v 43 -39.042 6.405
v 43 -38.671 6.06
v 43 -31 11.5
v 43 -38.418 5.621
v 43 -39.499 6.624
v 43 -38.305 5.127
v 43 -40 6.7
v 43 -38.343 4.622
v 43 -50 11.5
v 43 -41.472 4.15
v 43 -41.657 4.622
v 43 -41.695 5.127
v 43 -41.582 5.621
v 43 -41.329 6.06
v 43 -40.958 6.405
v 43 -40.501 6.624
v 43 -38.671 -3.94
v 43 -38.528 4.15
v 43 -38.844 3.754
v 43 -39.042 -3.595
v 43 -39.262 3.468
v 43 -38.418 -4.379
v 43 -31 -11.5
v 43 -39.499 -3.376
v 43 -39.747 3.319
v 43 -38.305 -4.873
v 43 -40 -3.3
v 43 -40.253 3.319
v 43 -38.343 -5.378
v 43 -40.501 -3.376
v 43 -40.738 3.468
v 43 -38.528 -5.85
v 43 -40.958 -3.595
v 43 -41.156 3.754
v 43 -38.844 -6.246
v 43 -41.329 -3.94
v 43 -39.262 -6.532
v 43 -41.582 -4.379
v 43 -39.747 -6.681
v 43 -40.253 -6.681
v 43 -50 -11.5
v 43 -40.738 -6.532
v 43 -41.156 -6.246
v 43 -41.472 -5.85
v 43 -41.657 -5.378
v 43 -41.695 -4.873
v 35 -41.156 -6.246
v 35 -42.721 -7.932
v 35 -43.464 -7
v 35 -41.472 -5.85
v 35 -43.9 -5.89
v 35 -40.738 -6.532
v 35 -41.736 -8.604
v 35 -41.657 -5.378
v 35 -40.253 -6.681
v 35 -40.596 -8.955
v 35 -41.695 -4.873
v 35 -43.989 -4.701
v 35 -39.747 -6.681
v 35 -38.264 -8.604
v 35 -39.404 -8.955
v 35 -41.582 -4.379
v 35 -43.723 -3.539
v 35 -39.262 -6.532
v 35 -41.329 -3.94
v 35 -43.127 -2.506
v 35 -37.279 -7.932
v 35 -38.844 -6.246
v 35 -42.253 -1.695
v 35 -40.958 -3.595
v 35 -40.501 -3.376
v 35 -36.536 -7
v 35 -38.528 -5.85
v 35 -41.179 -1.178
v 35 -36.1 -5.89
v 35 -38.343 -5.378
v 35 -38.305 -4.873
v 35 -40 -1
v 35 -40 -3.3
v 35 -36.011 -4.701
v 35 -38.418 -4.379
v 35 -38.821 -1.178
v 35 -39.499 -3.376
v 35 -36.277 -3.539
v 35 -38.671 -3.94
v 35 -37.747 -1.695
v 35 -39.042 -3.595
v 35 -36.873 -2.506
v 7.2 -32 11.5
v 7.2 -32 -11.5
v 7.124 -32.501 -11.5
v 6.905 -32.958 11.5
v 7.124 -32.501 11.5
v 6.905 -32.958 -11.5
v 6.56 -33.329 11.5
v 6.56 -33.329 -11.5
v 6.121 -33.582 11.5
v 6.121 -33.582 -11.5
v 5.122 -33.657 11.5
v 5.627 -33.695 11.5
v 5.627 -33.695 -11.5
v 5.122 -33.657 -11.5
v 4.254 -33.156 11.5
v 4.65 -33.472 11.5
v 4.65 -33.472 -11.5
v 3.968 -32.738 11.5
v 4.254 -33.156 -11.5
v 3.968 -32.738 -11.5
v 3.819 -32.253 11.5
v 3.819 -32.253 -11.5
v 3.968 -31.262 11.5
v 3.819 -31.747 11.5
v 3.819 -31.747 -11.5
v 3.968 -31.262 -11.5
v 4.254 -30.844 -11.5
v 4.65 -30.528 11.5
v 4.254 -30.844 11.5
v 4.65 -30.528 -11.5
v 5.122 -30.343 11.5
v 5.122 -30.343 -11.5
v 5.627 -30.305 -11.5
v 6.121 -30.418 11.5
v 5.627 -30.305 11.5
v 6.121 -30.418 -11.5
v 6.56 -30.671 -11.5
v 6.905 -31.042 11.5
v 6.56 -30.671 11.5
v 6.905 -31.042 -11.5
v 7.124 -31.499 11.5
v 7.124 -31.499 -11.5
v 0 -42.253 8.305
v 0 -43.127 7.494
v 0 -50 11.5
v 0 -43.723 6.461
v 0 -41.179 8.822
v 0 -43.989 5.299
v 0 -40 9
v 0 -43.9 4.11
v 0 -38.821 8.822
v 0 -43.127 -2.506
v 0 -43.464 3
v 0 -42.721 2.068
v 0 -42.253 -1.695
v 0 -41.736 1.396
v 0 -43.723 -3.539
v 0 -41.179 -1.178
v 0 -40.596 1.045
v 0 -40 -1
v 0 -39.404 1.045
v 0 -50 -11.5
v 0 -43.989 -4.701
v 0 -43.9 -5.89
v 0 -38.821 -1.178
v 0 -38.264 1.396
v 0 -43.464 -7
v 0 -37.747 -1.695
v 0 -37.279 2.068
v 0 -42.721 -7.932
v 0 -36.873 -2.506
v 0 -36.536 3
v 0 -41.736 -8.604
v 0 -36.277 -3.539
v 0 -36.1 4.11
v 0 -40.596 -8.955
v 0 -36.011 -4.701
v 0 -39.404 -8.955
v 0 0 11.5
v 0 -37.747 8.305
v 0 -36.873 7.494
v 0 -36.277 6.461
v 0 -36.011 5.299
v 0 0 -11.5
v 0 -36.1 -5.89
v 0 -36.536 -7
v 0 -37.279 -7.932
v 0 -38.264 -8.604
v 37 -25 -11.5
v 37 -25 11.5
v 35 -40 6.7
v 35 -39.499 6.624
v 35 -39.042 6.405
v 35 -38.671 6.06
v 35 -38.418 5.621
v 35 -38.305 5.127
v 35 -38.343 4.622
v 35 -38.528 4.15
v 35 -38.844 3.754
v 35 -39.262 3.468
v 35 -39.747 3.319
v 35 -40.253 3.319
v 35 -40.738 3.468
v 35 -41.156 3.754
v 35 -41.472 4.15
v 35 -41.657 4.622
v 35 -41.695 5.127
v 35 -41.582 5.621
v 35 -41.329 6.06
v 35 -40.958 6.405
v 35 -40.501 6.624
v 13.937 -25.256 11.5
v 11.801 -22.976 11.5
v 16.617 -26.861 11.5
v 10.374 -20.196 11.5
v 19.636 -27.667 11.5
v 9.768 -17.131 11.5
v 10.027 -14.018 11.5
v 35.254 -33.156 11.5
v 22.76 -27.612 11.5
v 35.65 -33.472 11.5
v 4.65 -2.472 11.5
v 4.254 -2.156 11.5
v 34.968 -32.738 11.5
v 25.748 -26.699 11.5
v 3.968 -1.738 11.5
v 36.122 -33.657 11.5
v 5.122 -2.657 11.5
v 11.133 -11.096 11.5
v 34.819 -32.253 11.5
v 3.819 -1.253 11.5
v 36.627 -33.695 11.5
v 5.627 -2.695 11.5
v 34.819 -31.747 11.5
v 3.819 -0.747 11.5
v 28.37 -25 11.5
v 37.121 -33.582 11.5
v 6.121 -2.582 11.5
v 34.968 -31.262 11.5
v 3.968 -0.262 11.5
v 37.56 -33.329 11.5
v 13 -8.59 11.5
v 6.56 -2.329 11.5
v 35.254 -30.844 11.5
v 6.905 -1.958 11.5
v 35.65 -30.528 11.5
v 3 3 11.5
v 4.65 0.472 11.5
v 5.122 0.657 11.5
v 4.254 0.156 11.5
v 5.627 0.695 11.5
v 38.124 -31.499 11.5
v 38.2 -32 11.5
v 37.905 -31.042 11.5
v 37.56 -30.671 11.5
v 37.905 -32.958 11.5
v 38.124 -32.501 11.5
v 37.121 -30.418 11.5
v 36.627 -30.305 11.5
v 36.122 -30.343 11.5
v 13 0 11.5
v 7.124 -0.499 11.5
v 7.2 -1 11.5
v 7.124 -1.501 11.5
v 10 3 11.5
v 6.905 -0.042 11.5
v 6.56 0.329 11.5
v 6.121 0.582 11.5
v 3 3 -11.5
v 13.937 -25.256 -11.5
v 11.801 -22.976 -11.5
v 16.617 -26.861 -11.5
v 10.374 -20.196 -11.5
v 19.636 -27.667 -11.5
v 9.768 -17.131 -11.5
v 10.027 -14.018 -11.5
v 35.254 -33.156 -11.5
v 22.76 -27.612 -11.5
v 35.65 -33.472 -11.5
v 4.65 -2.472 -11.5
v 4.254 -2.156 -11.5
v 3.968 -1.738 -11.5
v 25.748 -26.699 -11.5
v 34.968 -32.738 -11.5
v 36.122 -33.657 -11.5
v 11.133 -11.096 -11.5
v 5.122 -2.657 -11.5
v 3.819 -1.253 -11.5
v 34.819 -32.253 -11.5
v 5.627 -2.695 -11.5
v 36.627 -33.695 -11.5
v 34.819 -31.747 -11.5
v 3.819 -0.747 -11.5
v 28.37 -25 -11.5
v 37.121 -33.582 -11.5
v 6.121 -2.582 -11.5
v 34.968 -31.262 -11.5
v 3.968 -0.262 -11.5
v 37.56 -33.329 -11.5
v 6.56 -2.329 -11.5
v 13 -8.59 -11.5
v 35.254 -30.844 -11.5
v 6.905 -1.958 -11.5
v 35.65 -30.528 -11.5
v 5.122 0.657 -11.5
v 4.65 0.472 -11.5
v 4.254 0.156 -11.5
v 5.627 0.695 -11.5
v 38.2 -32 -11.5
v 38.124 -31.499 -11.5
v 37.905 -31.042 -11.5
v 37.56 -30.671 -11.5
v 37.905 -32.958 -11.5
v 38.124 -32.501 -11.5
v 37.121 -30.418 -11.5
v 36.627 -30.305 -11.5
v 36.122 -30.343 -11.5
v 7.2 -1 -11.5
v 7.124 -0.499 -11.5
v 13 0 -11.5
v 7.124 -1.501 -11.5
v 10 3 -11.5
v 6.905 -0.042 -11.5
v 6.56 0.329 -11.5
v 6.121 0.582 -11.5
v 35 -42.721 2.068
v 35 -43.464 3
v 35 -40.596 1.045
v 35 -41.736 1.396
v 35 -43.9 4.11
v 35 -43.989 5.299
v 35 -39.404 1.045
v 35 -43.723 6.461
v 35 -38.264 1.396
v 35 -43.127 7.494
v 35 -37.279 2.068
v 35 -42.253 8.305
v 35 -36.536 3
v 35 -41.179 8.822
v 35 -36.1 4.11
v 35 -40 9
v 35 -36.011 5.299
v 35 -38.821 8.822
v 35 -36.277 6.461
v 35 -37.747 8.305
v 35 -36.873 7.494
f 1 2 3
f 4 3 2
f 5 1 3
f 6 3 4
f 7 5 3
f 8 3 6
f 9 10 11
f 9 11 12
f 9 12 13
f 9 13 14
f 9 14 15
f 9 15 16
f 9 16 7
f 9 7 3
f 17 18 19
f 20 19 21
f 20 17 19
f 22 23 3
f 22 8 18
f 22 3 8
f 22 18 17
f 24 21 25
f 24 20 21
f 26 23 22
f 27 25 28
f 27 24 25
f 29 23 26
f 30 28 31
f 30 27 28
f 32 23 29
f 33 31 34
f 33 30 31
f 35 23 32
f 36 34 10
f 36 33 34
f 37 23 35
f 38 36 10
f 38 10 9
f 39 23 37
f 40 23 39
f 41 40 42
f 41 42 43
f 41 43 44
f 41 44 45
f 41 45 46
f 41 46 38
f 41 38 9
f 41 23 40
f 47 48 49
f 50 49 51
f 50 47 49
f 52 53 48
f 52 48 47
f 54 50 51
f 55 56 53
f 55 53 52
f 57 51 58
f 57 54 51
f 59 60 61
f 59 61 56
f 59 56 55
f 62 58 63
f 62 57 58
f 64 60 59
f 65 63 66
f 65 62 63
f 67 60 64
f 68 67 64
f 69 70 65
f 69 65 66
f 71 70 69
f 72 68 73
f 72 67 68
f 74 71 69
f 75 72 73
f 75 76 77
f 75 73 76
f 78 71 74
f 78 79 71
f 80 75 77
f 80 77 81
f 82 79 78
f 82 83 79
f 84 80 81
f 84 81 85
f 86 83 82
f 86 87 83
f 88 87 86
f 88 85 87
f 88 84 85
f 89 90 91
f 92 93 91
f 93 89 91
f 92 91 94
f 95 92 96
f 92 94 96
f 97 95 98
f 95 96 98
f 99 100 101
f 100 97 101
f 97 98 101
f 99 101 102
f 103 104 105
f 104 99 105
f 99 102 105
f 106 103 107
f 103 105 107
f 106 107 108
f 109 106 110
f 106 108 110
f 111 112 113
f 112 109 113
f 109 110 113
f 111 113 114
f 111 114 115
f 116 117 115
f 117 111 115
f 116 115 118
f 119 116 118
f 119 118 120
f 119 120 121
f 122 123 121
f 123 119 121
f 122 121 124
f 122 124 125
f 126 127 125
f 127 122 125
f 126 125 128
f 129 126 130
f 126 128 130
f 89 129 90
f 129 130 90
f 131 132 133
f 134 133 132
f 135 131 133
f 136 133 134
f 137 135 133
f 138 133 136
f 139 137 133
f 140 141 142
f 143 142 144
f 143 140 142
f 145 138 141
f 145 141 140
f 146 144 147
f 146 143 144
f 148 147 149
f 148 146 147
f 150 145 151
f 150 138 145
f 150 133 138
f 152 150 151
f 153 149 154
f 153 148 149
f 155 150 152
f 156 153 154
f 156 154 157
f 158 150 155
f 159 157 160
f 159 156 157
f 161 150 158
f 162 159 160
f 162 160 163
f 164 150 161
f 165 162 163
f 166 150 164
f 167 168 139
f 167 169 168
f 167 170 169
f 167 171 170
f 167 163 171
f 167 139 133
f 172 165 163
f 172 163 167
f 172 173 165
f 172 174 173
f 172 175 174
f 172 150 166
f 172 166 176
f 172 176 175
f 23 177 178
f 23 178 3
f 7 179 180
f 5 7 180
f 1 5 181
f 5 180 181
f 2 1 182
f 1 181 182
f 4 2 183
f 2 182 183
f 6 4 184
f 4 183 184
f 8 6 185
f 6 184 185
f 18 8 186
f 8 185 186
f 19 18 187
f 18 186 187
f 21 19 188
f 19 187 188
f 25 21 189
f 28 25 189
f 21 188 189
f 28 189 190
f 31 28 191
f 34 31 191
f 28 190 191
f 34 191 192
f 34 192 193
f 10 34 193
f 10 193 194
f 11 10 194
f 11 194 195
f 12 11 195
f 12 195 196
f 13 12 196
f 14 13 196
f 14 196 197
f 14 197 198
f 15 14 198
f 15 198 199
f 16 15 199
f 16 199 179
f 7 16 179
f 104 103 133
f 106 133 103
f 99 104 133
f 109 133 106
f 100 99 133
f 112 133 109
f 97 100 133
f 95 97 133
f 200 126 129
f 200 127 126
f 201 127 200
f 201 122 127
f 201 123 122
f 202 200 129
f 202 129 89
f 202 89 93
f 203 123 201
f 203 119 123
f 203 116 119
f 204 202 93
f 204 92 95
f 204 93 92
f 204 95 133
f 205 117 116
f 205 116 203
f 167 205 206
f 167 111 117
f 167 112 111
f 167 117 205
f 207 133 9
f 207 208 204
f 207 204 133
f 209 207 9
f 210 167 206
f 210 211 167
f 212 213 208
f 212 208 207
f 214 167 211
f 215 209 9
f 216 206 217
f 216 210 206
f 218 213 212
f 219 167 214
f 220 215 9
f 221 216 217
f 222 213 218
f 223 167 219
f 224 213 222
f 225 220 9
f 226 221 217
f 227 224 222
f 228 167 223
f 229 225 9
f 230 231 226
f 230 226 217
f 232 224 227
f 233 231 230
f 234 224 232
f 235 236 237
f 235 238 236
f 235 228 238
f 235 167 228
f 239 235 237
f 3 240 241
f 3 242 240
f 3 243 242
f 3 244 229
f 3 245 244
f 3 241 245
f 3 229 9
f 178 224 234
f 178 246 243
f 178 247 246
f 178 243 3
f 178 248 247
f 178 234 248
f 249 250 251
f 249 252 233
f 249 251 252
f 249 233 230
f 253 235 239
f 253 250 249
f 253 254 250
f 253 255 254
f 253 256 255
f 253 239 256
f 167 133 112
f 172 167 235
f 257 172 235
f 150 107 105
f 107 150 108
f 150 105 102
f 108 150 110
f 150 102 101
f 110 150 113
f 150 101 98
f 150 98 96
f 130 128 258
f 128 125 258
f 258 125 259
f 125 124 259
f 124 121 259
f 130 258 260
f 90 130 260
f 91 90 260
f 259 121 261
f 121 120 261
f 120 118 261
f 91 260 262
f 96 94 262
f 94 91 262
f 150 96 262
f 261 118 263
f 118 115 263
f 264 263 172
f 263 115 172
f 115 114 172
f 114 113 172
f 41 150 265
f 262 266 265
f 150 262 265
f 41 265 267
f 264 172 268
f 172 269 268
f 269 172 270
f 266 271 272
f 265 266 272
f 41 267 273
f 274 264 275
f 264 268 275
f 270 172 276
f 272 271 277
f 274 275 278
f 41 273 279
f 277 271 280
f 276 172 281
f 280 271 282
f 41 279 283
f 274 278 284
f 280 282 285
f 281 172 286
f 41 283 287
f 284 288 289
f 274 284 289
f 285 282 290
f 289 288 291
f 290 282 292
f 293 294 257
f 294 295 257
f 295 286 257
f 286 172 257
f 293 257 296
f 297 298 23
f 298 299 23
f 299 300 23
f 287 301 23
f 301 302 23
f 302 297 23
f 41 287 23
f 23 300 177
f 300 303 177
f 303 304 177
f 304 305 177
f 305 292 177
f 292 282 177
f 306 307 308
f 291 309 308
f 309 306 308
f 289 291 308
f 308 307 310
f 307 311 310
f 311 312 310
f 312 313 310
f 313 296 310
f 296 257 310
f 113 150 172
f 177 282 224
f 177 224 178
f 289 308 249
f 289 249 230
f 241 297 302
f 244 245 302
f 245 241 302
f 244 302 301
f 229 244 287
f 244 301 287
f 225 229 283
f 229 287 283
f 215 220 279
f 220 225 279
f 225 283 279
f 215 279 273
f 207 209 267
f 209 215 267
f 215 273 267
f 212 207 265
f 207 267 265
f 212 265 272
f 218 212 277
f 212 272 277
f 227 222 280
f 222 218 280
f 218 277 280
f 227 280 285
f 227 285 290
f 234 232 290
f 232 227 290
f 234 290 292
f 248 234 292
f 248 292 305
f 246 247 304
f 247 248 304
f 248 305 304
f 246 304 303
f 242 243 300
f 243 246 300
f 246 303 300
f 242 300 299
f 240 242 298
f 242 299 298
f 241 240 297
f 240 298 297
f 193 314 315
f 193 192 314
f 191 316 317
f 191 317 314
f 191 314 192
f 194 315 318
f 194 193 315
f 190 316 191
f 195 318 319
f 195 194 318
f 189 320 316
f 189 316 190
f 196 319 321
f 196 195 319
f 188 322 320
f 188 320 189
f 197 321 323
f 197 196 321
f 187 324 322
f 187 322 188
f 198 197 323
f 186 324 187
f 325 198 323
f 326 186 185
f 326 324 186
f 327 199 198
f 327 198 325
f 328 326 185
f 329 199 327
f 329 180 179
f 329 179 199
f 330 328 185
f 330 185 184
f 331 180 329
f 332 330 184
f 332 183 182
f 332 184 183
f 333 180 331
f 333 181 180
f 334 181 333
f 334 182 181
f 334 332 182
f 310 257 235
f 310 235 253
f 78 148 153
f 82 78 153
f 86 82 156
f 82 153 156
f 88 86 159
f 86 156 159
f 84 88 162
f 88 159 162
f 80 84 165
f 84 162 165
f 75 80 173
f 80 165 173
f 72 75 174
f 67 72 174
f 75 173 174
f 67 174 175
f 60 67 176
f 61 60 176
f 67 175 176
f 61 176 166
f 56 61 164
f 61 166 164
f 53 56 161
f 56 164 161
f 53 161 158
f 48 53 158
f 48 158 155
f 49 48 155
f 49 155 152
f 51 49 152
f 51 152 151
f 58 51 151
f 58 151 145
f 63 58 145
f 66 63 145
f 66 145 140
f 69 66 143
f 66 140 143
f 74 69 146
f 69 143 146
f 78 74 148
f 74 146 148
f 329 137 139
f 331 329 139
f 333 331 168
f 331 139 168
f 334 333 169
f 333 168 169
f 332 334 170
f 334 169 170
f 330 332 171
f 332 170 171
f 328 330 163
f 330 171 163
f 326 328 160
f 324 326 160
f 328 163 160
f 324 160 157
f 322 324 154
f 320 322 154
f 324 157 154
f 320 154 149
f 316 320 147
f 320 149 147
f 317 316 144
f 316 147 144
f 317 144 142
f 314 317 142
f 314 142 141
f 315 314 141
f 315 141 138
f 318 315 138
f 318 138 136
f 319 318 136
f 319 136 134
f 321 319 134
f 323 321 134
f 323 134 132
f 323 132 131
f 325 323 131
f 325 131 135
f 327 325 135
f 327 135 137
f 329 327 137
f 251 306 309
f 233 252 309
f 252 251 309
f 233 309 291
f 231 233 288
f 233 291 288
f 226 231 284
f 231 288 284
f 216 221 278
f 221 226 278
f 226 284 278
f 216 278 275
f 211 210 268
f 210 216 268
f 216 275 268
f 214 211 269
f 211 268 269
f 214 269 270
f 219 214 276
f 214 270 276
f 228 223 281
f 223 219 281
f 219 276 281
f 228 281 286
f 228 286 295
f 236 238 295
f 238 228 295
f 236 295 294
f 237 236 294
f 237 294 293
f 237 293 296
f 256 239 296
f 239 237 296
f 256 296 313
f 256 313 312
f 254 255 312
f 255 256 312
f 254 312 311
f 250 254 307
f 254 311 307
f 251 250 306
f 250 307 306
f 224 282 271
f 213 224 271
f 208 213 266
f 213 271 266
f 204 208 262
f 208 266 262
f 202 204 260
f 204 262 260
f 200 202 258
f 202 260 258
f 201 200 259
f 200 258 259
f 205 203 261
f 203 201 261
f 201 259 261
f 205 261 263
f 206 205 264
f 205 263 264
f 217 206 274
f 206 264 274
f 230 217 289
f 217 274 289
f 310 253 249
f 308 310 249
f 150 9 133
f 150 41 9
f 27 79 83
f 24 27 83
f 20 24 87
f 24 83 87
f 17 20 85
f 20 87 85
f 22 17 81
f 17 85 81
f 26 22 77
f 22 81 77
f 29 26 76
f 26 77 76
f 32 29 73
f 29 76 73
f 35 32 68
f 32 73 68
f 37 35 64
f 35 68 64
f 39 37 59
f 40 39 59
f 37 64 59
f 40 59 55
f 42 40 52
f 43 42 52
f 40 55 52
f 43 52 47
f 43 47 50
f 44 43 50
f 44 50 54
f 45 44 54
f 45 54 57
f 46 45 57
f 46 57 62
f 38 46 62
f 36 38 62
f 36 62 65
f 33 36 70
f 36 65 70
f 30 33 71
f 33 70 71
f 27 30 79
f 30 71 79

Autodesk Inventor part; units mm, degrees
ref_plane "YZ Plane" through (0, 0, 0) normal (1, 0, 0) x (0, 1, 0)
ref_plane "XZ Plane" through (0, 0, 0) normal (0, 1, 0) x (-1, 0, 0)
ref_plane "XY Plane" through (0, 0, 0) normal (0, 0, 1) x (1, 0, 0)
sketch "Sketch1" plane through (0, 0, 0) normal (0, 0, 1) x (1, 0, 0)
  line L0 (0, 0) -> (3, 3)
  line L1 (3, 3) -> (10, 3)
  line L2 (10, 3) -> (13, 0)
  line L3 (13, 0) -> (13, -8.5904)
  circle A0 centre (21, -16.5) radius 11.25
  line L4 (28.3697, -25) -> (37, -25)
  line L5 (37, -25) -> (43, -31)
  line L6 (43, -31) -> (43, -50)
  line L7 (43, -50) -> (0, -50)
  line L8 (0, -50) -> (0, 0)
  circle A1 centre (5.5, -1) radius 1.7
  circle A2 centre (5.5, -32) radius 1.7
  circle A3 centre (36.5, -32) radius 1.7
  line L9 (5.5, -32) -> (5.5, -1) construction
  line L10 (5.5, -32) -> (36.5, -32) construction
  dimension "d0" = 16.5
  dimension "d1" = 21
  dimension "d2" = 50
  dimension "d3" = 22.5
  dimension "d4" = 8
  dimension "d5" = 45
  dimension "d6" = 3
  dimension "d7" = 8.5
  dimension "d8" = 6
  dimension "d11" = 22
  dimension "d14" = 3.4
  dimension "d15" = 15.5
  dimension "d16" = 31
  dimension "d17" = 31
  dimension "d18" = 15.5
extrude "Extrusion1" add sketch "Sketch1" along normal mid plane 23 contours L0 L1 L2 L3 A0 L4 L5 L6 L7 L8
sketch "Sketch2" plane through (0, -50, 11.5) normal (-1, 0, 0) x (0, 0, 1)
  line L0 (-23, 53) -> (0, 53) construction
  line L1 (-11.5, 53) -> (-11.5, 0) construction
  line L2 (-23, 0) -> (0, 0) construction
  circle A0 centre (-16.5, 10) radius 1.7
  circle A1 centre (-6.5, 10) radius 1.7
  point P0 (-11.5, 50)
  dimension "d22" = 10
  dimension "d23" = 10
  dimension "d24" = 3.4
extrude "Extrusion2" cut sketch "Sketch2" against normal through all
sketch "Sketch3" plane through (0, -50, 11.5) normal (-1, 0, 0) x (0, 0, 1)
  circle A0 centre (-16.5, 10) radius 1.7 projected
  circle A1 centre (-16.5, 10) radius 4
  circle A2 centre (-6.5, 10) radius 1.7 projected
  circle A3 centre (-6.5, 10) radius 4
  point P0 (-11.5, 50)
  dimension "d27" = 8
  dimension "d28" = 8
extrude "Extrusion3" cut sketch "Sketch3" against normal blind 35 contours A0 | A1 | A2 | A3
equation "\"d17\" = d16"
properties part number "y-stepper-mount"
